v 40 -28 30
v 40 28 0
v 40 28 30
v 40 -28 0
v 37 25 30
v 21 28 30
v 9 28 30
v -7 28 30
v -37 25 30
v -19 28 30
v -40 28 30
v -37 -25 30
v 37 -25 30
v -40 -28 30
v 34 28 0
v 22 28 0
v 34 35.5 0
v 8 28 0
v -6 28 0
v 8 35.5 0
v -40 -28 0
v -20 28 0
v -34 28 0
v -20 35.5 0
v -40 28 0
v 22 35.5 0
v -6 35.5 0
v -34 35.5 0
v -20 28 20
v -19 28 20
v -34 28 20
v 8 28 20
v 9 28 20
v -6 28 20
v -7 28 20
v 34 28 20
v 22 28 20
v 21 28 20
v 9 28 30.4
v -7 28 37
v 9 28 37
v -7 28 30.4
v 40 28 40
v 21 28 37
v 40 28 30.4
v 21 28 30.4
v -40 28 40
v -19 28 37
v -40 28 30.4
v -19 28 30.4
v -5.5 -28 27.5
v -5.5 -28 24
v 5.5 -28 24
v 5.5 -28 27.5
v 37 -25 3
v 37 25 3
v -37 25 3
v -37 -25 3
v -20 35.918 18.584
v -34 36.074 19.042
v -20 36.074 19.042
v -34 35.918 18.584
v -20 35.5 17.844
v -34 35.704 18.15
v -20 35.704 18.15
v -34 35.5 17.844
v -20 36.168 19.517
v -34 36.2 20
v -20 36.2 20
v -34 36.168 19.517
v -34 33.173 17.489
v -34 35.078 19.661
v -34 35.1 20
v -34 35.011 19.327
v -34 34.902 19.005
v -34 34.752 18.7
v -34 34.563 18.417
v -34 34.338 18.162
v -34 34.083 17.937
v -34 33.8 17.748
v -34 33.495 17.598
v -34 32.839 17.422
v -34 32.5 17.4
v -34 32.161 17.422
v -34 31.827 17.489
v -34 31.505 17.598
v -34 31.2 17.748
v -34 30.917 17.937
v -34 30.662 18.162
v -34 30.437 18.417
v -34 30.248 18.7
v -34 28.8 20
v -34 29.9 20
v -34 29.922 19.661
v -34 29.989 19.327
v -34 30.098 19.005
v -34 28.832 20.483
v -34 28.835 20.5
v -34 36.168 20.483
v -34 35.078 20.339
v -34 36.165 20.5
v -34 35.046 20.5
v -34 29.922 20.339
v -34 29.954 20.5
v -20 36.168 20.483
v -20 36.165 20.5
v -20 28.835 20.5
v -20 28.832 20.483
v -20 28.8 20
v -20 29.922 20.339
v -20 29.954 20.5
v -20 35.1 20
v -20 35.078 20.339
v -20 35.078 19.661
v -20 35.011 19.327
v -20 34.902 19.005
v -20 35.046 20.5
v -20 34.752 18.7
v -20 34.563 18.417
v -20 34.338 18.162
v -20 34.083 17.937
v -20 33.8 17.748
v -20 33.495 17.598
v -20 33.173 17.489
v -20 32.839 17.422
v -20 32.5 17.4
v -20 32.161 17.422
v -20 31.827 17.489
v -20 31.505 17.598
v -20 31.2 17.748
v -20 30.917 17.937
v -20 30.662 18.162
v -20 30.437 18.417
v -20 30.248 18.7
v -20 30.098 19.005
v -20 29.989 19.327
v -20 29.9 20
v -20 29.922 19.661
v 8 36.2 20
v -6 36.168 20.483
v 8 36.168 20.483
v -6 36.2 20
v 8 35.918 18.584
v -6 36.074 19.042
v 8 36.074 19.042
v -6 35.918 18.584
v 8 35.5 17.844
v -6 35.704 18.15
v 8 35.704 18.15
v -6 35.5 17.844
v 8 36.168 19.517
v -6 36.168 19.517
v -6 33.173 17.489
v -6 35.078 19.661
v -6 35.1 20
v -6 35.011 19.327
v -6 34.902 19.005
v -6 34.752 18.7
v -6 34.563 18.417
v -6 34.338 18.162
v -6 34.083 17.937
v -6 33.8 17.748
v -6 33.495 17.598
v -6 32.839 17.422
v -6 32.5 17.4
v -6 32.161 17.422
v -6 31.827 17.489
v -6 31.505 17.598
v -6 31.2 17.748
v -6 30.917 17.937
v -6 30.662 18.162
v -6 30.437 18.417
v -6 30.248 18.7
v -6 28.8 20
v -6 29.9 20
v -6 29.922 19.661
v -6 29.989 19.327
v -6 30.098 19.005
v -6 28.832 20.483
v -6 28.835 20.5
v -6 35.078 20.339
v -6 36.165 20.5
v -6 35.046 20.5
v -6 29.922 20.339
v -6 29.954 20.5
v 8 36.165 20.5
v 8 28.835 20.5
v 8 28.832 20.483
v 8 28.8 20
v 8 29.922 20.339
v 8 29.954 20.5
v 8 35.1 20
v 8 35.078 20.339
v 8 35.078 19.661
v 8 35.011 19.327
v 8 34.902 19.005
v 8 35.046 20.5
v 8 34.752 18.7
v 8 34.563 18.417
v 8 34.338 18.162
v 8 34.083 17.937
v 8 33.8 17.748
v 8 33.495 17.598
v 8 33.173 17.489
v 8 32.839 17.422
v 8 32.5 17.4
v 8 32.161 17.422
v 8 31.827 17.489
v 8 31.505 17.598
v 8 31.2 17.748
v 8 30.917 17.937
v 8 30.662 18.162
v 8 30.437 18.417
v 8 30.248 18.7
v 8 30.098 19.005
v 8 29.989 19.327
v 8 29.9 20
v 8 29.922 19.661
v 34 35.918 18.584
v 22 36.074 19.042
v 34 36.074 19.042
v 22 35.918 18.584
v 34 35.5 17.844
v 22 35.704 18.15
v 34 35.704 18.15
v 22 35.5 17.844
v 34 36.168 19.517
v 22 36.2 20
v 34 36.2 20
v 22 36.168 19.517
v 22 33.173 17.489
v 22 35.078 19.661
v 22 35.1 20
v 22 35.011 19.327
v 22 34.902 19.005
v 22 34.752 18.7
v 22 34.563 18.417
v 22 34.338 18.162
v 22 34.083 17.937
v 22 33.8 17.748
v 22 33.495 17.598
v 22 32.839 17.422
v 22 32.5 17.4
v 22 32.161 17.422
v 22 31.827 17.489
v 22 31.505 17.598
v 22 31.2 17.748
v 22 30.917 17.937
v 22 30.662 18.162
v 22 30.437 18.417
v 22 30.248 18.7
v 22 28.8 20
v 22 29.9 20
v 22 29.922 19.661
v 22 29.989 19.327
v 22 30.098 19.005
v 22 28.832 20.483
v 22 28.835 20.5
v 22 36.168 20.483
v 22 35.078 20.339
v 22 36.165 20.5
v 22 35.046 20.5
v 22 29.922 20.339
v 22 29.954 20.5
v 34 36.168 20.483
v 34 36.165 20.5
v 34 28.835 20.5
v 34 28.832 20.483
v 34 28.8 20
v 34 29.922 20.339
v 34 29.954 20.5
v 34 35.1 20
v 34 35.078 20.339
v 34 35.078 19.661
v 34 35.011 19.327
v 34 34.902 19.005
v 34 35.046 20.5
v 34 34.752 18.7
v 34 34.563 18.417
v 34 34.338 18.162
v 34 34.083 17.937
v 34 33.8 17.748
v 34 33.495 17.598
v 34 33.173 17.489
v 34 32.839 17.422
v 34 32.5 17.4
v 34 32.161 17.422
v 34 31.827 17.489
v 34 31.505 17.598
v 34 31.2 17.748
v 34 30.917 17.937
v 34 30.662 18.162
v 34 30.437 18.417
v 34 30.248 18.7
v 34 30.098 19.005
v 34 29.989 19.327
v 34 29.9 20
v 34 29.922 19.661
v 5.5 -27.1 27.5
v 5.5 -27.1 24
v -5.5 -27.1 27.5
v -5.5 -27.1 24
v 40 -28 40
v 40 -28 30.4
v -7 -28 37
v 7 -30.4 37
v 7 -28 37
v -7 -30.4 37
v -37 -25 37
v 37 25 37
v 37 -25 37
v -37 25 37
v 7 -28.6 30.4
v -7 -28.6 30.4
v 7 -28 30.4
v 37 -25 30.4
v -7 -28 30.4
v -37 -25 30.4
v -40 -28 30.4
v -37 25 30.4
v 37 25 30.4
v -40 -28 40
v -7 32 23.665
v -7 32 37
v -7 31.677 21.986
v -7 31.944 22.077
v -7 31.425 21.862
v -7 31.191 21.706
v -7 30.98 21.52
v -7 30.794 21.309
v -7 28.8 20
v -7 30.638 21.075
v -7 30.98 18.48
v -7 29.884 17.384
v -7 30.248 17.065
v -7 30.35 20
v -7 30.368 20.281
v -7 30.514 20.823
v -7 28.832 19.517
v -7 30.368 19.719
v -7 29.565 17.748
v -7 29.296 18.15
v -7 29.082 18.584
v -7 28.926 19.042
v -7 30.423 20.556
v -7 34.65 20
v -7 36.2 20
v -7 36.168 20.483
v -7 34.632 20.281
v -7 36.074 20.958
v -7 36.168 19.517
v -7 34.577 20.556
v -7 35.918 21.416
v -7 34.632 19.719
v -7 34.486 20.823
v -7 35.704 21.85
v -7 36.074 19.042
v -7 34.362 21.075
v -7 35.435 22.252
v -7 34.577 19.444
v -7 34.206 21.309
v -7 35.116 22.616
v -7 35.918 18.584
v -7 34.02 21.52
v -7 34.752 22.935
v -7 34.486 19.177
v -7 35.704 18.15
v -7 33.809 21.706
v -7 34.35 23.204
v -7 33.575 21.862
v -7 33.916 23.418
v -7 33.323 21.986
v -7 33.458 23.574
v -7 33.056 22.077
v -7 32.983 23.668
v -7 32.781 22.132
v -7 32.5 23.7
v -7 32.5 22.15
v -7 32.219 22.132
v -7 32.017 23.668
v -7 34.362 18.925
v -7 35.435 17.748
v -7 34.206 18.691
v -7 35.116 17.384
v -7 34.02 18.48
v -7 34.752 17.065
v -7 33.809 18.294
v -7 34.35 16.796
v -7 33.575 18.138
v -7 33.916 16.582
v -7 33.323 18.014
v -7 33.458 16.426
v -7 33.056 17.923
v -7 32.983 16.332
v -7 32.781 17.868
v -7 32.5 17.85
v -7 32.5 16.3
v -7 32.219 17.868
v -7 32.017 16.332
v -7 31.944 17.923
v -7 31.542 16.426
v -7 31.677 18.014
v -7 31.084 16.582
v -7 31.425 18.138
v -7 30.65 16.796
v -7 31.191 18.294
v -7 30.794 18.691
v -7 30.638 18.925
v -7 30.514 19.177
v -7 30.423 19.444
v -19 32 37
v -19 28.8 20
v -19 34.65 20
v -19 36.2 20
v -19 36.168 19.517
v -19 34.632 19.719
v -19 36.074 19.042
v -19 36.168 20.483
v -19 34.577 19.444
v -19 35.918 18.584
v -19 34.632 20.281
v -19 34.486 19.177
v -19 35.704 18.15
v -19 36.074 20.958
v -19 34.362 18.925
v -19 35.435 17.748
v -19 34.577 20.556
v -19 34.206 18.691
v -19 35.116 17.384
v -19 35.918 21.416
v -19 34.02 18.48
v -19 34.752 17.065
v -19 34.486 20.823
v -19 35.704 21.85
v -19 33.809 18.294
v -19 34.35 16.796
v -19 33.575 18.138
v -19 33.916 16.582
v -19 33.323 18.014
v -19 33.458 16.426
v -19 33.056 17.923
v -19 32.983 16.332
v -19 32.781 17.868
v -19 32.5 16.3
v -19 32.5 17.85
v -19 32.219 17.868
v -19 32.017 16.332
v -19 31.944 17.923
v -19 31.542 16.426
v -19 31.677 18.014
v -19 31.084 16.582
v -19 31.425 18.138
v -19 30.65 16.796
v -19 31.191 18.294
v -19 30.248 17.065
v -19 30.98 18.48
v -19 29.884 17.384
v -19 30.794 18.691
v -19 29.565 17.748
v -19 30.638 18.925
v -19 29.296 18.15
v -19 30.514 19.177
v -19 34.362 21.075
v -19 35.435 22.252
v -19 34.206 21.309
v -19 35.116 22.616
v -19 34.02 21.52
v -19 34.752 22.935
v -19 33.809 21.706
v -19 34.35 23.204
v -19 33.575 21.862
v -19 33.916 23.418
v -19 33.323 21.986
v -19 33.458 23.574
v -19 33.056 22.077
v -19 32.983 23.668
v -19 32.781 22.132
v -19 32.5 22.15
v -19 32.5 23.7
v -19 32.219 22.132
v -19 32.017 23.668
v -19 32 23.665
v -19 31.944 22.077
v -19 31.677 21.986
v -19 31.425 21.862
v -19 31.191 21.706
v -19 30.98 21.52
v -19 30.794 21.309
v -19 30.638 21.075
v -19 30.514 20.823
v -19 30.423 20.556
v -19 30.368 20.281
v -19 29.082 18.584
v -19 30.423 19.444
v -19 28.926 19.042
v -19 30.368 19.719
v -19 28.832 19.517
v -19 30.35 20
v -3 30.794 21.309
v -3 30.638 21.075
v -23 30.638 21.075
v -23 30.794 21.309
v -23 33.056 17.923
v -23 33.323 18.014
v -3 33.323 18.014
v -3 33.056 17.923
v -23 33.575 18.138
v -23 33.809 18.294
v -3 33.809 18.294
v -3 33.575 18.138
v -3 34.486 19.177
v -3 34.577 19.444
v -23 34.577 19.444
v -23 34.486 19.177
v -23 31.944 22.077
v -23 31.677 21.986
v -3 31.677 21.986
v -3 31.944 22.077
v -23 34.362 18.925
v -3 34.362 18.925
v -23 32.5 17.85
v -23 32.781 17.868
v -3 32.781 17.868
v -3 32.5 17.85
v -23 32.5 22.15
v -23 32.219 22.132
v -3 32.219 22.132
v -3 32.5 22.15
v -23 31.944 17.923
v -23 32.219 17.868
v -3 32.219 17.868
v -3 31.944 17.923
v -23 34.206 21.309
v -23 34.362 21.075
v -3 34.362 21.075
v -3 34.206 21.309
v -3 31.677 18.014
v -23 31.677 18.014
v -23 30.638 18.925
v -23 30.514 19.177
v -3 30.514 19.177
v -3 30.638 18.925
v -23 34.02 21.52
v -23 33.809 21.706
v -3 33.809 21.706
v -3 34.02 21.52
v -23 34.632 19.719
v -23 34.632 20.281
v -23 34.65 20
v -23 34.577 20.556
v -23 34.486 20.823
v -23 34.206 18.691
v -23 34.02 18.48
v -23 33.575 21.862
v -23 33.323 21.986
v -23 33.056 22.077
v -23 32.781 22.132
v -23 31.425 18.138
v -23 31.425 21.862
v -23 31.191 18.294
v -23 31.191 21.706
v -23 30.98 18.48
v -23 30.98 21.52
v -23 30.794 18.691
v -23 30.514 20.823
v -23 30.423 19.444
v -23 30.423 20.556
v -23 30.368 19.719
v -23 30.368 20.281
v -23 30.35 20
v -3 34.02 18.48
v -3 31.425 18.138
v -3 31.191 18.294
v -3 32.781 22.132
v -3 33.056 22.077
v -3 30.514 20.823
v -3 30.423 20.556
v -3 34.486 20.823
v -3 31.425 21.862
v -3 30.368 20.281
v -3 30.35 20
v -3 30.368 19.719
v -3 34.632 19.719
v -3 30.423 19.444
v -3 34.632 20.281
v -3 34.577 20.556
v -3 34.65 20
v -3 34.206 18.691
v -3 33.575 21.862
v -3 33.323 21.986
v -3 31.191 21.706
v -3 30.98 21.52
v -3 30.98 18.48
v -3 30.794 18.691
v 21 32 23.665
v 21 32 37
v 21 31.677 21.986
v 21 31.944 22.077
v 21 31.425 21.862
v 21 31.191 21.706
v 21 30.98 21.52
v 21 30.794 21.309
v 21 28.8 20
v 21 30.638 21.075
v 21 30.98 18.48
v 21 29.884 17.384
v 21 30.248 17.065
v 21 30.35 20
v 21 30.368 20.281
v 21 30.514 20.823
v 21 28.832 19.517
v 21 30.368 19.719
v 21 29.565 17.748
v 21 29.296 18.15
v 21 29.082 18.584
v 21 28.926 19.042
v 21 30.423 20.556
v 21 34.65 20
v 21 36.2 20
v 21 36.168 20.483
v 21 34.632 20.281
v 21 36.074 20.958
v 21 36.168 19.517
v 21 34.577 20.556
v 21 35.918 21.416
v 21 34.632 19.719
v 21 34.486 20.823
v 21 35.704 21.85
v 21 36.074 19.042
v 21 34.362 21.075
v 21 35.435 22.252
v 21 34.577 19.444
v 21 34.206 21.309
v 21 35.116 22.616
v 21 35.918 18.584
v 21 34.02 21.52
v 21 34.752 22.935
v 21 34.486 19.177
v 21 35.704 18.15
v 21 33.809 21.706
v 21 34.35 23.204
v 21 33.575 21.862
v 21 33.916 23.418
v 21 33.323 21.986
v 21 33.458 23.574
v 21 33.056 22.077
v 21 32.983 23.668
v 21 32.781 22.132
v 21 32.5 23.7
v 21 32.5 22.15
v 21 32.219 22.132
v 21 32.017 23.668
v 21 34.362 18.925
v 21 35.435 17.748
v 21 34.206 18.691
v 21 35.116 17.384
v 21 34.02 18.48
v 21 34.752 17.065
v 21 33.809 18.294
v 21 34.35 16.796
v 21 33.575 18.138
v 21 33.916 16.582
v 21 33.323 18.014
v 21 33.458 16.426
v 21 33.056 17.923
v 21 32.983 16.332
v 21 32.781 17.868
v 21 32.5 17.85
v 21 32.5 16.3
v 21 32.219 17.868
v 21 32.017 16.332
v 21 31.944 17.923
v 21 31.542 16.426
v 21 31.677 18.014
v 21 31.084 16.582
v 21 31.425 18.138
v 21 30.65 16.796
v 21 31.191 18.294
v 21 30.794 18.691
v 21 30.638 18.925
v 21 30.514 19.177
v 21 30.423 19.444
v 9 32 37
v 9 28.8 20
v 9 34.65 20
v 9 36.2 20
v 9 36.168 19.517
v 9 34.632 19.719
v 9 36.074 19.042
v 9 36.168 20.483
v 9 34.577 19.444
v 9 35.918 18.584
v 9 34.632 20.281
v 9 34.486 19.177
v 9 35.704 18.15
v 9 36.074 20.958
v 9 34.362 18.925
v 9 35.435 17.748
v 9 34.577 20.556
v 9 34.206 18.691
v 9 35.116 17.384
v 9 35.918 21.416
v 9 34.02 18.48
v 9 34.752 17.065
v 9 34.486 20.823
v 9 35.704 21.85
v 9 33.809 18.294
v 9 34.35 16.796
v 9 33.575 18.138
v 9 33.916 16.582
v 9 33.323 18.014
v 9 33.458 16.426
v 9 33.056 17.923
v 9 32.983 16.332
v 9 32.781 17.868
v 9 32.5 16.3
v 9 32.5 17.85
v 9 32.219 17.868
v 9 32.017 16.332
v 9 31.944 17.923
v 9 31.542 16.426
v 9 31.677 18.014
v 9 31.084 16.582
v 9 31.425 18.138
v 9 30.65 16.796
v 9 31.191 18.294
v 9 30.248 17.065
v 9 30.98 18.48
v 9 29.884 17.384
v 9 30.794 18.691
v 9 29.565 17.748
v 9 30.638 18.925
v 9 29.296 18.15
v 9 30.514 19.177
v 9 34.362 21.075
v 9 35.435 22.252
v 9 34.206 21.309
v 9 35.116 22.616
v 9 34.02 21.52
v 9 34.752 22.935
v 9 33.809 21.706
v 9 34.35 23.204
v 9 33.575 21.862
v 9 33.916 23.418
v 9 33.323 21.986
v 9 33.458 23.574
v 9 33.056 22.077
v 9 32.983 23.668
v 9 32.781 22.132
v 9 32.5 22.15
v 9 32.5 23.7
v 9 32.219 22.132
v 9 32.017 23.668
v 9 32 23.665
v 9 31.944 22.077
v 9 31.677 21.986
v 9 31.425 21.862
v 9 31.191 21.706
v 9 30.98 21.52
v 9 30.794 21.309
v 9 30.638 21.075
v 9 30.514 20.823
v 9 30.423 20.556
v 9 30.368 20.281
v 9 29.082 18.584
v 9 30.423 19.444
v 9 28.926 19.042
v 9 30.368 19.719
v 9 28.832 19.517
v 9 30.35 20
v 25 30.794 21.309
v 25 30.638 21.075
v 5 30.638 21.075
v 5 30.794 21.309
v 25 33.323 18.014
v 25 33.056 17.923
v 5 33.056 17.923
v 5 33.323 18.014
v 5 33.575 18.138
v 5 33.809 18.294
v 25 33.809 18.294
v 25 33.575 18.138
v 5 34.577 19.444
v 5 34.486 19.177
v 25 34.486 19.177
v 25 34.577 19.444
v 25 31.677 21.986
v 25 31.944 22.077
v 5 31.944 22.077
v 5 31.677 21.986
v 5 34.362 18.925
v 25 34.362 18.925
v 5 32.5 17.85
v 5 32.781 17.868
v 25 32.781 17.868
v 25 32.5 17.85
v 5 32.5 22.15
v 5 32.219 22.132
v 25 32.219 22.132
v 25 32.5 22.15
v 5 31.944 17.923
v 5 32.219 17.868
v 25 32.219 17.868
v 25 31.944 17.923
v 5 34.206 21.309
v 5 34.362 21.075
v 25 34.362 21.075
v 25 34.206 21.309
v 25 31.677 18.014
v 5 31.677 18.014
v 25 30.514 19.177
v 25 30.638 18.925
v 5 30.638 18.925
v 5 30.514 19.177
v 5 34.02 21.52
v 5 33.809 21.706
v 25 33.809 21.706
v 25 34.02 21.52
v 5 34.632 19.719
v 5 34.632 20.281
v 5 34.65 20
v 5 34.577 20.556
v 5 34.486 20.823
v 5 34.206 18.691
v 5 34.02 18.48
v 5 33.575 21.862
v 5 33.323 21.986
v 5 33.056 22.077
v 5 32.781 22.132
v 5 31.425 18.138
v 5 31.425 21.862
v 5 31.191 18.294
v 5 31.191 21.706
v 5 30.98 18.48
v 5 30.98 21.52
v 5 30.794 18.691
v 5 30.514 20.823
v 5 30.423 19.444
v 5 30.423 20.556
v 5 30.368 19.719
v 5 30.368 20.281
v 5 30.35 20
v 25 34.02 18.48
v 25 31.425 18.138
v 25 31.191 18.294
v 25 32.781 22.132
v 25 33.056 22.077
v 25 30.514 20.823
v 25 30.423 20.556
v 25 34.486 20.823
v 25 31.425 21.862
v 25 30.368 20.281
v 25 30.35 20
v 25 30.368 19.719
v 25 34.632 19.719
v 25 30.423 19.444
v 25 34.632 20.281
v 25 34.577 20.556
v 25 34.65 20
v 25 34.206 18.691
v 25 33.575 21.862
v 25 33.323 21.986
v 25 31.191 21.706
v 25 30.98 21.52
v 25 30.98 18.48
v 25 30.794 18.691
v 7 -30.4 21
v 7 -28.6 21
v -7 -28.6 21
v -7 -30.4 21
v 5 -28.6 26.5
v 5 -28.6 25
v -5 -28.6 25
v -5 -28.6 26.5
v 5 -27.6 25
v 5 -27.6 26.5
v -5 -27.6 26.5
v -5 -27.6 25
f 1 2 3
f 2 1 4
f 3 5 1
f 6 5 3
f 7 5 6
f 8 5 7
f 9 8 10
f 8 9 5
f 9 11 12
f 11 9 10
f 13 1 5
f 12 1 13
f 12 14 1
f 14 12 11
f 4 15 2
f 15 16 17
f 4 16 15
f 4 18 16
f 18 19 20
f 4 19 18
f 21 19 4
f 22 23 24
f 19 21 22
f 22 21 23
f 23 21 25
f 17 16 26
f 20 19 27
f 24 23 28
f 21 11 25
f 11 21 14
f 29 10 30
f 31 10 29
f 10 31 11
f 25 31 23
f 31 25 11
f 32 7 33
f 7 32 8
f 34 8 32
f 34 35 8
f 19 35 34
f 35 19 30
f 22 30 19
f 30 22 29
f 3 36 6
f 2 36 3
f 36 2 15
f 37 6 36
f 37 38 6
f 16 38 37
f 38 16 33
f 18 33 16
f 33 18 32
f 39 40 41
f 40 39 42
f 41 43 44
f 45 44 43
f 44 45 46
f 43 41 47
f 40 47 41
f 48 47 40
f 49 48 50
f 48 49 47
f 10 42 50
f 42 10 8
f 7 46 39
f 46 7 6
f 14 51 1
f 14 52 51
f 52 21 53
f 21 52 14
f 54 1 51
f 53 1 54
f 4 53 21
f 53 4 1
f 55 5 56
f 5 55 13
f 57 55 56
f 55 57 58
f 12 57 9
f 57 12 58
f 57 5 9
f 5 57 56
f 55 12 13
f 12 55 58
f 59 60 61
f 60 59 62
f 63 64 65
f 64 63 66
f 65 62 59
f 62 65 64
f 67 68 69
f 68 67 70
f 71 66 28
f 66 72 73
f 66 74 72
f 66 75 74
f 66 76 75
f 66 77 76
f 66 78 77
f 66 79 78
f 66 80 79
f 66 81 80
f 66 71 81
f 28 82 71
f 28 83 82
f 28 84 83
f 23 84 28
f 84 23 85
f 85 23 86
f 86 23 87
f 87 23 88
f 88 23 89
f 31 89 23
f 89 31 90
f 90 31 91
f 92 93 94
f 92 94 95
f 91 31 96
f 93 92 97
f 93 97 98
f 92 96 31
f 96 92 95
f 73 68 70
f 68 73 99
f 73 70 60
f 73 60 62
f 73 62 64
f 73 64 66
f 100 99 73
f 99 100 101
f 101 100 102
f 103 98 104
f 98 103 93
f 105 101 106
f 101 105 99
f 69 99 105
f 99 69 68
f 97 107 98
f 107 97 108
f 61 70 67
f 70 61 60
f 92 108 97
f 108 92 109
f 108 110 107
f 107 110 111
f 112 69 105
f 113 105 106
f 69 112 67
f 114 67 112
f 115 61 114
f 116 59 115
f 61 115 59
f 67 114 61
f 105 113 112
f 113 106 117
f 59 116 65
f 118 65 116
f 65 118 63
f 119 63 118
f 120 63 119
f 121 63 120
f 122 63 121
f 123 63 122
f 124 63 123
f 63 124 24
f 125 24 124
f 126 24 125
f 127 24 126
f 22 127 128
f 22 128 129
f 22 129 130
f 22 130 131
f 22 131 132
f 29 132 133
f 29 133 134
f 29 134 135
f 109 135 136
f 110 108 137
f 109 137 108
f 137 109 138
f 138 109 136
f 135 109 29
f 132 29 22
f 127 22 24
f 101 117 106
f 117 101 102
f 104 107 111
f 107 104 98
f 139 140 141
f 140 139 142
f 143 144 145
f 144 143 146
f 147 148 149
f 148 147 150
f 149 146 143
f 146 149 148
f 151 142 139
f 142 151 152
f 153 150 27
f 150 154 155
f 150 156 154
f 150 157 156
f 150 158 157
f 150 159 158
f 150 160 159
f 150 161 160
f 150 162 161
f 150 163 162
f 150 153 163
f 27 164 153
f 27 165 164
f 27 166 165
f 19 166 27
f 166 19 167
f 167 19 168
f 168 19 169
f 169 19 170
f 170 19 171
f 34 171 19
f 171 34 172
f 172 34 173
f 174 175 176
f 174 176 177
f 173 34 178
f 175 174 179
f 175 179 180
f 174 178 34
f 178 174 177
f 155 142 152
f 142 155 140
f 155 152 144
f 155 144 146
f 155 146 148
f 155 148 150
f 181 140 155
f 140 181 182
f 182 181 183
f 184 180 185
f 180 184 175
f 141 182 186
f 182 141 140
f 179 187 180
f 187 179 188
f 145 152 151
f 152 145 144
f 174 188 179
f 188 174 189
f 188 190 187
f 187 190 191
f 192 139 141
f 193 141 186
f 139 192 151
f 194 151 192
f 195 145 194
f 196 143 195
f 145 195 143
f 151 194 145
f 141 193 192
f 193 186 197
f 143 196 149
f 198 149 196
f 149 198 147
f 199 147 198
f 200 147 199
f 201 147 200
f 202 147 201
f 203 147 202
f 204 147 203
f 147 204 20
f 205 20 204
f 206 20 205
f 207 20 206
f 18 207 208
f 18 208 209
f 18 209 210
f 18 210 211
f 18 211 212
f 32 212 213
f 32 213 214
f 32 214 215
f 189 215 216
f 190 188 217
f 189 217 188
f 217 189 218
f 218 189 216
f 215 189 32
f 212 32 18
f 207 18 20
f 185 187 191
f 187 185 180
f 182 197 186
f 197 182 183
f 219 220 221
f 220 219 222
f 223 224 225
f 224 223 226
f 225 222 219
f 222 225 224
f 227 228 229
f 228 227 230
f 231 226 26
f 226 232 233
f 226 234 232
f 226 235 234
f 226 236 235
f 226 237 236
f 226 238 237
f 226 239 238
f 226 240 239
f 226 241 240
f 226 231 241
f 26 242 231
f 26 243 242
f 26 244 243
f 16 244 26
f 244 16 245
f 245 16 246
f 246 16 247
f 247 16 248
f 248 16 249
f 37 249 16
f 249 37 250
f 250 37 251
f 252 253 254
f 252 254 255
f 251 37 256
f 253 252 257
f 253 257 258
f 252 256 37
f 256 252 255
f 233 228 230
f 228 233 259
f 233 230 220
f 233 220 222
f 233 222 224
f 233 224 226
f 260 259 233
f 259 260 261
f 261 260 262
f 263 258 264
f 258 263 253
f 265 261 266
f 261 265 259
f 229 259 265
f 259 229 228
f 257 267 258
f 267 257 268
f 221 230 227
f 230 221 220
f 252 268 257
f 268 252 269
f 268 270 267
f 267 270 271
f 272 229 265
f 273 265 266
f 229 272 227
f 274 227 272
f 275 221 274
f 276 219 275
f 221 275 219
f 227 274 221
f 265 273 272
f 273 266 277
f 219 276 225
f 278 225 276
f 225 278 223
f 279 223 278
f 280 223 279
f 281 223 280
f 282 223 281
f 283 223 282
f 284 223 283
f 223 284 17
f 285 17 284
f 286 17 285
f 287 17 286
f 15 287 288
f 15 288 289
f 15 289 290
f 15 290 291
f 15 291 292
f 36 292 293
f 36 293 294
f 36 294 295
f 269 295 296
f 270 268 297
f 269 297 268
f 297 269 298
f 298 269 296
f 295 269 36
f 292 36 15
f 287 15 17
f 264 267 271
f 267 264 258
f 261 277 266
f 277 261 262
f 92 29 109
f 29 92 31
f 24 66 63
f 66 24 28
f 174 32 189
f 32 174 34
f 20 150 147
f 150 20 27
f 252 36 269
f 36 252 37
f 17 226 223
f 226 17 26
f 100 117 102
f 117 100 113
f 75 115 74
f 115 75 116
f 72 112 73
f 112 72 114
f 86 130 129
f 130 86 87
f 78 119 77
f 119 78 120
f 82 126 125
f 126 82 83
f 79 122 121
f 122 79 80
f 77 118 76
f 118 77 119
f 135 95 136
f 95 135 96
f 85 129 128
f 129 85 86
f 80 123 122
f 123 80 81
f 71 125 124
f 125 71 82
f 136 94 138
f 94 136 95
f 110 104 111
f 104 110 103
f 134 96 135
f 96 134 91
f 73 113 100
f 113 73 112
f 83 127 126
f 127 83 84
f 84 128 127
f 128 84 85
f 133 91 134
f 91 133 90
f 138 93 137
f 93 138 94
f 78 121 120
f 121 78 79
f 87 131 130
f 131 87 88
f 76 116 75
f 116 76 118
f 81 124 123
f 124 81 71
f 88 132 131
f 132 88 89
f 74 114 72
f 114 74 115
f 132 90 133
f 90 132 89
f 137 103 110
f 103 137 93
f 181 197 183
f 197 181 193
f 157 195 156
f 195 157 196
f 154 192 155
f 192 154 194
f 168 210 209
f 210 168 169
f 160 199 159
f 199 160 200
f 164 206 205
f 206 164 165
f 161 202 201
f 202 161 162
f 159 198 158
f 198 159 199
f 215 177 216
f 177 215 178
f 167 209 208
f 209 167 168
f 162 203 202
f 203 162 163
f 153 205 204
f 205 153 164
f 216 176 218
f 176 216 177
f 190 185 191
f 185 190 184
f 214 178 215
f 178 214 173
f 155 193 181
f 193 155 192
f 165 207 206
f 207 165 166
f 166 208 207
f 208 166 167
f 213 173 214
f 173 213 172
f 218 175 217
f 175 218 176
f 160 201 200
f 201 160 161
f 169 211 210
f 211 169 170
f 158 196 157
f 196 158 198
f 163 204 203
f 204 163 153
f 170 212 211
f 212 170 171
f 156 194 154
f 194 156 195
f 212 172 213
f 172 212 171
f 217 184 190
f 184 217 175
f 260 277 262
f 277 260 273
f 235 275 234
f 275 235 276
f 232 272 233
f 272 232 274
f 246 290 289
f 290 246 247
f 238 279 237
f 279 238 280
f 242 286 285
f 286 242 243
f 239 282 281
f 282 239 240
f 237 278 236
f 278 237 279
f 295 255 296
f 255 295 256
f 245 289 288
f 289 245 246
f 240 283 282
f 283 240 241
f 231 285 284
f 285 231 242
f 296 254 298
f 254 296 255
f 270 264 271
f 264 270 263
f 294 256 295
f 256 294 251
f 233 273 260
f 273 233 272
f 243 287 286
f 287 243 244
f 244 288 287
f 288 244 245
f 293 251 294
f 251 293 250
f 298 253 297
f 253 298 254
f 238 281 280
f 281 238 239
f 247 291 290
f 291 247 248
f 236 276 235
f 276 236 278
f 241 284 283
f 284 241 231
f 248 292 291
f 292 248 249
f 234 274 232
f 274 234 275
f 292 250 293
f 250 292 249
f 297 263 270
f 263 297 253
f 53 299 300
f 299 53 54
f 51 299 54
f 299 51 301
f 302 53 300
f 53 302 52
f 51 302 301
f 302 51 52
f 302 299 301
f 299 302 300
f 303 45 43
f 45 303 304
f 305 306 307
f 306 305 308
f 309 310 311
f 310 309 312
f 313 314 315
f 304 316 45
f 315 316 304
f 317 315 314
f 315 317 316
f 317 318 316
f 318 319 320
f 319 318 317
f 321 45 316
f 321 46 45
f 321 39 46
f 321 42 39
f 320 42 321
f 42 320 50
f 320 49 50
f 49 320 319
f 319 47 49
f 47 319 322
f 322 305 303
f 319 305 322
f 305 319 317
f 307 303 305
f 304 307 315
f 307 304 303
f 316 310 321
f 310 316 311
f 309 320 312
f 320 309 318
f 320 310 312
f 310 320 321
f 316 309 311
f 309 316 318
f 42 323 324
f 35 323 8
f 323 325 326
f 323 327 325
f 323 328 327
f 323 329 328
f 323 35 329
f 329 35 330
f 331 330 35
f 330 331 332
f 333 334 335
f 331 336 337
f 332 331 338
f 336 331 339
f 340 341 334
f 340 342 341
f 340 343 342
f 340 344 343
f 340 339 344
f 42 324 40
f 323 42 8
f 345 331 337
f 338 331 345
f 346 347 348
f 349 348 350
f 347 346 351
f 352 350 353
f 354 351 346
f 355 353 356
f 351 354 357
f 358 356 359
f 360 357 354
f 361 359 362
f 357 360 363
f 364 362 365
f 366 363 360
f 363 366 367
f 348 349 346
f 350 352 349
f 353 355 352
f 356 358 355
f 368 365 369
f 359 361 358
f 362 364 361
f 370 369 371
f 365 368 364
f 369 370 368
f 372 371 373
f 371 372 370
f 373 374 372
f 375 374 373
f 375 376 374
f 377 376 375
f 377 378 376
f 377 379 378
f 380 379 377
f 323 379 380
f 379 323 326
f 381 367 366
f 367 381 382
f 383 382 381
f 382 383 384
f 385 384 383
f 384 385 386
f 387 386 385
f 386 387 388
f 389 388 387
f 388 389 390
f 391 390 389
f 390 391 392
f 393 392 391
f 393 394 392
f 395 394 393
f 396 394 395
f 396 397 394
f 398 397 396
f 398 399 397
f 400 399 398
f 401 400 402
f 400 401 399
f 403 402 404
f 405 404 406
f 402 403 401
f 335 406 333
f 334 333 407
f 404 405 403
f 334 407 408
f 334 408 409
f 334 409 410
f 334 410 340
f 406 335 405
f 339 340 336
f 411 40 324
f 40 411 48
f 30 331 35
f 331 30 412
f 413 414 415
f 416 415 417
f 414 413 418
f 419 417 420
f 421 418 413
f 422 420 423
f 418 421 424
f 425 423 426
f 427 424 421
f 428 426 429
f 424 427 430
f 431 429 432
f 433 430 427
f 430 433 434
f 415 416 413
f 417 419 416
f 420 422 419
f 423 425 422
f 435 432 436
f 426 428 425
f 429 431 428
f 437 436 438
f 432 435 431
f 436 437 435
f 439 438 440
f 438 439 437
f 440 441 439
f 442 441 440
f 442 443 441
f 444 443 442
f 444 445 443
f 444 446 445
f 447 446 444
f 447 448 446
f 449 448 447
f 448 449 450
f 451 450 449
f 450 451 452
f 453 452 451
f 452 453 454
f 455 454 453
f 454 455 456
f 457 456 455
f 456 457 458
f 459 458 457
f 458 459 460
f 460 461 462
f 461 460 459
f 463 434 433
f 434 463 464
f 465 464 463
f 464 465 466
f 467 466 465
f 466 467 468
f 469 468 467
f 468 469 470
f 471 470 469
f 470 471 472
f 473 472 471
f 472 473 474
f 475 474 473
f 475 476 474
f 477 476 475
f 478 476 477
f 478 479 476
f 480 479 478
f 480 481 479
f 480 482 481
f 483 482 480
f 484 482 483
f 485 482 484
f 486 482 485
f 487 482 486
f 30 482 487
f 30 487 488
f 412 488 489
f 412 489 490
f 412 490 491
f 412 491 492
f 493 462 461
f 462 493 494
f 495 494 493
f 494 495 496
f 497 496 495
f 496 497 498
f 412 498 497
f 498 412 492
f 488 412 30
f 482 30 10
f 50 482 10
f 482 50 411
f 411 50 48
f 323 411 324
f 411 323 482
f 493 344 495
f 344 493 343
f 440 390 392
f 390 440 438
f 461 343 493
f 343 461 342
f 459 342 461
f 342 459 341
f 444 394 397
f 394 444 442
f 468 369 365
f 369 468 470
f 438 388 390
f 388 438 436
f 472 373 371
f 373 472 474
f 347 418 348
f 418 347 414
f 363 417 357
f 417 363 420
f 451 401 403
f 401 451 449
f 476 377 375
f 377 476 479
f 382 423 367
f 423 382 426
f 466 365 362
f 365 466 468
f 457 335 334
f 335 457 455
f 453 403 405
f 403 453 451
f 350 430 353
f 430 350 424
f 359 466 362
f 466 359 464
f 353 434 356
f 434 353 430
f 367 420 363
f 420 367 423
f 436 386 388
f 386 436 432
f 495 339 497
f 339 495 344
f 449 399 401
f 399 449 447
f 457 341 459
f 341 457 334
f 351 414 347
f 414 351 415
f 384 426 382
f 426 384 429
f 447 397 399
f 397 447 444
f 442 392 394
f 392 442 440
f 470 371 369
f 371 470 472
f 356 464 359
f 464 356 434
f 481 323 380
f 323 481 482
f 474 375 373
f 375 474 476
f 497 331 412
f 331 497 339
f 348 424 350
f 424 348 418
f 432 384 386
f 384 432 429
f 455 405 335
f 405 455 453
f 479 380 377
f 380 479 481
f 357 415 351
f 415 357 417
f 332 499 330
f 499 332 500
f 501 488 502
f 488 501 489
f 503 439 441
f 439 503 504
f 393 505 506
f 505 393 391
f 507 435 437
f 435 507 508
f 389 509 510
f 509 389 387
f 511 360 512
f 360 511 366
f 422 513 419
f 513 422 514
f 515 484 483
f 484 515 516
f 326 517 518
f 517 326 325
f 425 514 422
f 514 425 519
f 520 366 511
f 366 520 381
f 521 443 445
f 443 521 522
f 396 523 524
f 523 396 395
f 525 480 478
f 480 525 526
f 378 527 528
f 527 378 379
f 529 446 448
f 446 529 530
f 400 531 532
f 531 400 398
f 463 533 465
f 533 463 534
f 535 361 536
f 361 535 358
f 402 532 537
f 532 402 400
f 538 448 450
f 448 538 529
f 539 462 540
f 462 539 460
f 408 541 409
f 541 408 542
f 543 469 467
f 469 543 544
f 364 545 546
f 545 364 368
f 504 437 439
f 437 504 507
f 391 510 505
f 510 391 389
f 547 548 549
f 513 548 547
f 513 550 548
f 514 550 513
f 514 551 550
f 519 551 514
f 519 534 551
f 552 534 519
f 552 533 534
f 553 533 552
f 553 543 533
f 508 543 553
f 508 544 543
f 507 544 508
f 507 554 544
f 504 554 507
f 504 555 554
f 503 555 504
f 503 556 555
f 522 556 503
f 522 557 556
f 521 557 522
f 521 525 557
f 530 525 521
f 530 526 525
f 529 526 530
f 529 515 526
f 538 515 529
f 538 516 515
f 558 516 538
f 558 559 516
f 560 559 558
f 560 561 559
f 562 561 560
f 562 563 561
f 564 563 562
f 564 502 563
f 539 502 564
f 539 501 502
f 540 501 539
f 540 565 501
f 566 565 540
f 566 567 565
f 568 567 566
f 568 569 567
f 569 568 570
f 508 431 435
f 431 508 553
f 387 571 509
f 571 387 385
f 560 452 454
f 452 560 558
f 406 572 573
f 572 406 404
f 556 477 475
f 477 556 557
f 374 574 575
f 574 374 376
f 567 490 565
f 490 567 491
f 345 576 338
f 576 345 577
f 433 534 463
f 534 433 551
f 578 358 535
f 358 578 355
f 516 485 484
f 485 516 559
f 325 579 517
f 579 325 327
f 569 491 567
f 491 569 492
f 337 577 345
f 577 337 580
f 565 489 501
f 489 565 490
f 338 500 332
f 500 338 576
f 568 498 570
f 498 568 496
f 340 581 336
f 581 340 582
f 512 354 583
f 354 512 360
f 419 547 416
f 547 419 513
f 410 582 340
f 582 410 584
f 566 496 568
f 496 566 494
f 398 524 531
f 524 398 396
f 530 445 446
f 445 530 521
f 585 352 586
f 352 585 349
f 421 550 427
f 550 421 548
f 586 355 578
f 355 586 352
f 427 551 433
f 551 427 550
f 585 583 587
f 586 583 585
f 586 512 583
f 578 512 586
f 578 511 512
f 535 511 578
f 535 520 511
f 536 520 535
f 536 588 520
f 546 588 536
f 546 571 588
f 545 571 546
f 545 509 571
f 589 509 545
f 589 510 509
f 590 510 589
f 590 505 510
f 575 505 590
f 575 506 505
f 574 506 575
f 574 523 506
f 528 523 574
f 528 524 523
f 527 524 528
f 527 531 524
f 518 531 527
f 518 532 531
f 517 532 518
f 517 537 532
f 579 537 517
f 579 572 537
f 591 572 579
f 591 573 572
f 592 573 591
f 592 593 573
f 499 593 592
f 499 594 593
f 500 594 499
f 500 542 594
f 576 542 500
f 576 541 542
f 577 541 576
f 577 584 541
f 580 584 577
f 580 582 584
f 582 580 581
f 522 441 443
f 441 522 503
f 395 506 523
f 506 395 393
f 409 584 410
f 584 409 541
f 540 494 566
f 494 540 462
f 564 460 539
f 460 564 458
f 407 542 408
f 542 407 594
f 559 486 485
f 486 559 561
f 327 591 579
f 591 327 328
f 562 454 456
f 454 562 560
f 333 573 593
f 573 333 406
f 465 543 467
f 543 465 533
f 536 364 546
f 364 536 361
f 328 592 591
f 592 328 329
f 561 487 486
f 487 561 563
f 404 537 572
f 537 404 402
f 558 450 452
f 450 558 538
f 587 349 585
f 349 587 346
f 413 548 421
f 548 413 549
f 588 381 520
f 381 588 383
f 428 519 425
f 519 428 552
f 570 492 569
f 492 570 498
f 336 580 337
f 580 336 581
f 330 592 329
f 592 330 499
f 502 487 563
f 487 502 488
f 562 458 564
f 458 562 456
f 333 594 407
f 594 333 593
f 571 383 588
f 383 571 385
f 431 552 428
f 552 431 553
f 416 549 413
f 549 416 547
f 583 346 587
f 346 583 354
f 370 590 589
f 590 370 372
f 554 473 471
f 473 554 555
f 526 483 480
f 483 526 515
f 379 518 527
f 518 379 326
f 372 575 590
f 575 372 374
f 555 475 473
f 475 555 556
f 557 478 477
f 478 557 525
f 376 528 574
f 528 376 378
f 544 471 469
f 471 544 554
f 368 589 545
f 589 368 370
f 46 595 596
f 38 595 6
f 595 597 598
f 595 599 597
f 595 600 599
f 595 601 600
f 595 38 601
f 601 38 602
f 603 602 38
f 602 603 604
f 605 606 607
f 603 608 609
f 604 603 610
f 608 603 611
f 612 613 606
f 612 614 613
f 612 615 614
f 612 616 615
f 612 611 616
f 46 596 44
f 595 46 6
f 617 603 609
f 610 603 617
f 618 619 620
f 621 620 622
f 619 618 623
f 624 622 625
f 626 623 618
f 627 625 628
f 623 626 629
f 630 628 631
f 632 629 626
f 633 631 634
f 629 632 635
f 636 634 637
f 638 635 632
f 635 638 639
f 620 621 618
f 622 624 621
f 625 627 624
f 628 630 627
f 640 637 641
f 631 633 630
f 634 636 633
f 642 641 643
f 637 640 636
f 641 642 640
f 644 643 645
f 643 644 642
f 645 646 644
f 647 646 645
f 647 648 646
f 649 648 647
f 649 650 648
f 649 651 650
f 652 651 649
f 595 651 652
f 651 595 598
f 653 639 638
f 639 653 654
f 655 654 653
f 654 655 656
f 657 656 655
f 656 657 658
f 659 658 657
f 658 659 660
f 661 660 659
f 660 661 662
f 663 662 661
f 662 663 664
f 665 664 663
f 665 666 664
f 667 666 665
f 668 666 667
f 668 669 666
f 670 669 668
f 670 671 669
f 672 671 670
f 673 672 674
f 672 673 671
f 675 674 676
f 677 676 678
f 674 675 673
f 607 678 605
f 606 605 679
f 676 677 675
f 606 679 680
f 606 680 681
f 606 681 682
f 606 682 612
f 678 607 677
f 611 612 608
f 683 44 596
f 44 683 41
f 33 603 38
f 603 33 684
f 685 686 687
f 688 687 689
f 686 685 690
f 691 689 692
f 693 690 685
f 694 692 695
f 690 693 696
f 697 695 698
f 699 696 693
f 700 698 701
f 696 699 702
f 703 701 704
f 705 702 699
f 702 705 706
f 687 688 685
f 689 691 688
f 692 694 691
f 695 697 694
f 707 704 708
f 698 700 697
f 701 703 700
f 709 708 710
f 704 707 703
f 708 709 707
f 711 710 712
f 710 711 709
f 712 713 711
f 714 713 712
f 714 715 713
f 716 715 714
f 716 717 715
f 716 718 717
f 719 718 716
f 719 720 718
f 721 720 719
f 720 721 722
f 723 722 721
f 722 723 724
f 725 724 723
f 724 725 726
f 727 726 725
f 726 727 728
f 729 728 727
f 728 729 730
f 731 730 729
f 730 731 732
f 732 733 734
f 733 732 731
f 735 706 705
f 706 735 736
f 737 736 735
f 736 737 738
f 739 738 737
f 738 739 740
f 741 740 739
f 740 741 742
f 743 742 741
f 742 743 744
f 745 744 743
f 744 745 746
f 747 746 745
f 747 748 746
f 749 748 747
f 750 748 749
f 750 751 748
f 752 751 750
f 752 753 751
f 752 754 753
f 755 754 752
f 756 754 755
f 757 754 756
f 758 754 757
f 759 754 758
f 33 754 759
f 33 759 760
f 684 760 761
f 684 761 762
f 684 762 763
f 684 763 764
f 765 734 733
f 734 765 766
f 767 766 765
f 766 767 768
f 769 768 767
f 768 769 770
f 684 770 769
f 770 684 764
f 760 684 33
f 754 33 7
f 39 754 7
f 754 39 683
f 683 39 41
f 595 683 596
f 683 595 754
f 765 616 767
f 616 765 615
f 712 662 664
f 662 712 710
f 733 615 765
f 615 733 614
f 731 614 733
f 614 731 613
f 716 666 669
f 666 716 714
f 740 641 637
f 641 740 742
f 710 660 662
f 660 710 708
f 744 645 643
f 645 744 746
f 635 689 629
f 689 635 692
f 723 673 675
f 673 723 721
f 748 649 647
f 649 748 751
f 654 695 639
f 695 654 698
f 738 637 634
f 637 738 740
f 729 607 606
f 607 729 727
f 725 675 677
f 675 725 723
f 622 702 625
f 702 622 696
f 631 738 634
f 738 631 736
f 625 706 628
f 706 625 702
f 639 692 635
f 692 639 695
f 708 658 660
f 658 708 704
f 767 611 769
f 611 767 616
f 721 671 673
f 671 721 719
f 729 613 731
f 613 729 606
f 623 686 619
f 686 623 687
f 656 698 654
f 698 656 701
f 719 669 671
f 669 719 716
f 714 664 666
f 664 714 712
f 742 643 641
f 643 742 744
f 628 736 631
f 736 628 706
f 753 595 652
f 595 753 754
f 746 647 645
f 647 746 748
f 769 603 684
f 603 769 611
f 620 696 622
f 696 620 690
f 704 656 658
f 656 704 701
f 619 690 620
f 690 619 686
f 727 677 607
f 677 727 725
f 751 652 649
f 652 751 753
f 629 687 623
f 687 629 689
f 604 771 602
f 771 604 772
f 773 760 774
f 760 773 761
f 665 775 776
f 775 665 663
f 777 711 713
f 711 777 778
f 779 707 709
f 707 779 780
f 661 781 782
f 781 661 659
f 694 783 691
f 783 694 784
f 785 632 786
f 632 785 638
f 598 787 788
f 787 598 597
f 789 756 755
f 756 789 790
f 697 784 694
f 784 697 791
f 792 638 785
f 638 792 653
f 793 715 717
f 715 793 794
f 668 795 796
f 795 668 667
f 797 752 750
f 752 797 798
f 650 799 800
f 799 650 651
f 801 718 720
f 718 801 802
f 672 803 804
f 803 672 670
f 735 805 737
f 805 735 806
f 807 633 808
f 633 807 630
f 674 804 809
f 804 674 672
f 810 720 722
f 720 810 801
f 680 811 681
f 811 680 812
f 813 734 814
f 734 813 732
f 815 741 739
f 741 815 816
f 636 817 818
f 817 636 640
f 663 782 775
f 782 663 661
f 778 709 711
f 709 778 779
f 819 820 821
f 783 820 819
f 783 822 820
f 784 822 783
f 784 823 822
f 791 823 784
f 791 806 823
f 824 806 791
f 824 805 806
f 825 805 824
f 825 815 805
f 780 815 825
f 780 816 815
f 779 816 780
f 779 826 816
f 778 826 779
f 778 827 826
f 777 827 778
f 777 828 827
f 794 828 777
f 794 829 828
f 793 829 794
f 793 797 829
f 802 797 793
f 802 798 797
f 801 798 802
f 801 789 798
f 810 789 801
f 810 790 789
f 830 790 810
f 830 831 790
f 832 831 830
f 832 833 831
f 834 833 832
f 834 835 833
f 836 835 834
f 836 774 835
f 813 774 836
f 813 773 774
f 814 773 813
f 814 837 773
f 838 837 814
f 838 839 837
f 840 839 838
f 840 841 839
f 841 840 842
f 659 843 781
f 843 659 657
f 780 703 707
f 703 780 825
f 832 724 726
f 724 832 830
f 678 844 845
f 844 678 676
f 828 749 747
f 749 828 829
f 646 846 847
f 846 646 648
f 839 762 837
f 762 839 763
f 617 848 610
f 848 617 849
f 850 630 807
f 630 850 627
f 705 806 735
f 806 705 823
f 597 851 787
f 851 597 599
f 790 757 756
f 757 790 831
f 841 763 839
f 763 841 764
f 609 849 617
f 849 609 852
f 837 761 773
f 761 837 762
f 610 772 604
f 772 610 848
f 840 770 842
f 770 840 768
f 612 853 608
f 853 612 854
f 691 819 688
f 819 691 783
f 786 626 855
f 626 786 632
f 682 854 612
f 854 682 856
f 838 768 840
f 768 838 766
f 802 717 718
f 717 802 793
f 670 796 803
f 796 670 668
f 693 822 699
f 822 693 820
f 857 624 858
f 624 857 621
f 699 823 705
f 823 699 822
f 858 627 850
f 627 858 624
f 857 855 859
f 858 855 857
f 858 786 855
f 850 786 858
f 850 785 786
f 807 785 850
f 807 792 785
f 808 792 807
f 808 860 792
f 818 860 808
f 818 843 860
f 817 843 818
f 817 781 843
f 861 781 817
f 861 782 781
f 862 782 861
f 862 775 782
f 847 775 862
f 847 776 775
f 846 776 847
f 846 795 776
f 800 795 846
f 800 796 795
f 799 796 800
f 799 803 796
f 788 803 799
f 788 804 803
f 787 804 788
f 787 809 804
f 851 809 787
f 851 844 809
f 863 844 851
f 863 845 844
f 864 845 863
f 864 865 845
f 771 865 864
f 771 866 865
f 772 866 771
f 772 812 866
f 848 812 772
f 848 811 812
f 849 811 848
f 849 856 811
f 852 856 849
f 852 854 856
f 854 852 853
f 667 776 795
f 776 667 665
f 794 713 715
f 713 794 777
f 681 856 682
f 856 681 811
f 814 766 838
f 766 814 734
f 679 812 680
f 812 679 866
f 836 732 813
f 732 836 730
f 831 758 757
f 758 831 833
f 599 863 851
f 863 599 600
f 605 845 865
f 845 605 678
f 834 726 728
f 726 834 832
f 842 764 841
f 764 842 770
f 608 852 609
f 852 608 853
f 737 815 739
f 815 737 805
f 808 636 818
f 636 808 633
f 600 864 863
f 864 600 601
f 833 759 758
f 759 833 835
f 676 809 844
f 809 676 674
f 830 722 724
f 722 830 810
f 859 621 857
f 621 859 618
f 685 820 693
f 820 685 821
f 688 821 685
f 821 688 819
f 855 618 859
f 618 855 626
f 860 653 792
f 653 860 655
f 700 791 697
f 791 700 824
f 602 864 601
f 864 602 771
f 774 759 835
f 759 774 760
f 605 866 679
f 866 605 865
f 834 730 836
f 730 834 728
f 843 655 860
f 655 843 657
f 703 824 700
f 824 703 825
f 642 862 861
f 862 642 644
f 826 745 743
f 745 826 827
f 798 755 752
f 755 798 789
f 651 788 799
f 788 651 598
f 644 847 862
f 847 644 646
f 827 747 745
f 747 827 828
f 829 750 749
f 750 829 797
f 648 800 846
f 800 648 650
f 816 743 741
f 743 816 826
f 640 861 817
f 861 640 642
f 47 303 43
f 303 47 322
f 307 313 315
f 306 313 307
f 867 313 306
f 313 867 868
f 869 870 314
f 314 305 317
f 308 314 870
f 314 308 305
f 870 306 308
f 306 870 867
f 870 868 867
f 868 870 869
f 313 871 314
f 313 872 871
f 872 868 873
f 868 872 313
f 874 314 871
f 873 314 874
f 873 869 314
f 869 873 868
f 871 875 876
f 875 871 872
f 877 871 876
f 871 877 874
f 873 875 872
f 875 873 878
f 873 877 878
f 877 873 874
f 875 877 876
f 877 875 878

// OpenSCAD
// Print-in-place hinged box, 80 x ~65 x 40 mm closed (80 x 56 body + hinge/catch)
// Parts: base, lid, pin.  Assembly = closed box.  Print pose = lid open 180 deg,
// lying flat behind the base, both trays opening up, pin captive in the knuckles.
part = "assembly"; // [assembly, base, lid]
cadverify_only = "";
module instance(name, p, unit = 1) {
    echo(cadverify_instance = [name, p, unit]);
    if (cadverify_only == "" || cadverify_only == name) children();
}
$fn = 48;
// ---- dimensions (assembly / closed coordinates) ----
W = 80; D = 56; base_h = 30; lid_top = 40; wall = 3;
ax_y = 32.5; ax_z = 20;            // hinge axis, 0.8 mm behind rear wall (y=28)
r_out = 3.7; r_bore = 2.6; r_stub = 2.15; // lid pin stubs, 0.45 radial clearance in base bores
base_segs = [[-34, -20], [-6, 8], [22, 34]];
lid_segs  = [[-19, -7], [9, 21]];
module cylx(x0, len, r) translate([x0, 0, 0]) rotate([0, 90, 0]) cylinder(h = len, r = r);
module base_closed() {
    difference() {
        union() {
            difference() {
                translate([-40, -28, 0]) cube([80, 56, 30]);
                translate([-37, -25, 3]) cube([74, 50, 30]);
            }
            for (s = base_segs) {
                translate([s[0], 27, 0]) cube([s[1] - s[0], 8.5, 20]); // pillar to bed, supports knuckle
                intersection() { // open-top cradle (lower knuckle): lid stub drops in, no enclosed bore
                    translate([0, ax_y, ax_z]) cylx(s[0], s[1] - s[0], r_out);
                    translate([s[0], ax_y - 4, ax_z - 4]) cube([s[1] - s[0], 8, 4.5]);
                }
            }
        }
        for (s = base_segs) translate([0, ax_y, ax_z]) cylx(s[0] - 1, s[1] - s[0] + 2, r_bore);
        translate([-5.5, -29, 24]) cube([11, 1.9, 3.5]); // catch pocket, front wall
    }
}
module lid_closed() {
    union() {
            translate([-40, -28, 37]) cube([80, 56, 3]);               // top panel
            difference() {                                              // skirt
                translate([-40, -28, 30.4]) cube([80, 56, 6.6]);
                translate([-37, -25, 29]) cube([74, 50, 8]);
            }
            for (s = lid_segs) {
                translate([s[0], 28, 20]) cube([s[1] - s[0], 4, 17]);  // hinge strap
                translate([0, ax_y, ax_z]) cylx(s[0], s[1] - s[0], r_out);
                translate([0, ax_y, ax_z]) cylx(s[0] - 4, s[1] - s[0] + 8, r_stub); // integral pin stubs into base cradles
            }
            translate([-7, -30.4, 30.4]) cube([14, 2.4, 6.6]);          // catch spacer
            translate([-7, -30.4, 21]) cube([14, 1.8, 12]);             // catch tab
            translate([-5, -28.6, 25.0]) cube([10, 1.0, 1.5]);          // catch bump (smaller, less snap penetration)
    }
}
module lid_print() translate([0, -28.8, 0]) translate([0, ax_y, ax_z])
    rotate([180, 0, 0]) translate([0, -ax_y, -ax_z]) lid_closed();
// ---- specs (exported-part coordinates) ----
if (part == "base") echo(cadverify_spec = [
    ["bounds", [[-40, -28, 0], [40, 36.2, 30]]], ["bodies", 1], ["through_holes", 0],
    ["support_faces", [["bed", "-z", 4000]]],
    ["overhangs_allowed", [["hinge cradle groove, pillars rise to the knuckles from the bed", [[-40, 26, 14], [40, 37, 24]]],
                            ["catch pocket ceiling", [[-8, -29, 23], [8, -26, 29]]]]],
    ["copies", 1],
    ["details", [
        ["floor", "material", [[-37, -25, 0], [37, 25, 3]], 0.95],
        ["cavity", "void", [[-36, -24, 10], [36, 24, 29]], 0.98],
        ["base_knuckle", "material", [[-30, 34.8, 19], [-24, 35.8, 20]], 0.7],
        ["cradle_groove", "void", [[-30, 31.8, 19.3], [-24, 33.2, 20.7]], 0.95],
        ["front_wall", "thickness", [0, -35, 15], [0, 1, 0], 3]
    ]]]);
if (part == "lid") echo(cadverify_spec = [
    ["bounds", [[-40, 0, 0], [40, 66.6, 23.7]]], ["bodies", 1], ["through_holes", 0],
    ["support_faces", [["bed", "-z", 4000]]],
    ["overhangs_allowed", [["strap and hinge knuckle undersides, within 5 mm of the panel edge and straps", [[-40, 0, 2], [40, 10, 24]]],
                            ["catch tab and bump undersides", [[-8, 62, 2], [8, 67, 20]]]]],
    ["copies", 1],
    ["details", [
        ["panel", "material", [[-37, 10, 0], [37, 60, 3]], 0.95],
        ["tray_cavity", "void", [[-35, 14, 3.5], [35, 57, 9]], 0.95],
        ["strap", "material", [[10, 5, 10], [20, 7.5, 18]], 0.85],
        ["panel_thickness", "thickness", [0, 35, -5], [0, 0, 1], 3],
        ["catch_tab", "view", [[-8, 64, 6], [8, 67, 20]]]
    ]]]);
if (part == "assembly") echo(cadverify_spec = [
    ["bounds", [[-40, -30.4, 0], [40, 36.2, 40]]],
    ["support_faces", [["bed", "-z", 4000]]],
    ["allowed_interferences", []],
    ["motions", [["lid_open", ["lid"], "rotate", [0, 32.5, 20], [-1, 0, 0], [0, 180],
        ["flex", [["lid", "base", 1.0, "catch bump snaps out of its pocket and tab flexes"]]]]]],
    ["assembly_order", [
        [["base"], [0, 0, 0]],
        [["lid"], [0, 0, -1], ["rotate", [0, 32.5, 20], [-1, 0, 0], -180]]
    ]],
    ["print_in_place", 0.4],
    ["print_pose", [["lid_open", 180]]],
    ["overhangs_allowed", [["hinge cradles, knuckles, straps and pin stubs, supported by pillars, panel edge and straps within 5 mm", [[-40, 27, 2], [40, 38, 26]]],
                            ["catch tab, spacer and bump in print pose", [[-8, 88, 2], [8, 96, 20]]],
                            ["catch pocket ceiling", [[-8, -31, 20], [8, -26, 29]]]]]
]);
// ---- output ----
if (part == "base") base_closed();
else if (part == "lid") lid_print();
else if (part == "assembly") {
    instance("base", "base") base_closed();
    instance("lid", "lid") lid_closed();
}
